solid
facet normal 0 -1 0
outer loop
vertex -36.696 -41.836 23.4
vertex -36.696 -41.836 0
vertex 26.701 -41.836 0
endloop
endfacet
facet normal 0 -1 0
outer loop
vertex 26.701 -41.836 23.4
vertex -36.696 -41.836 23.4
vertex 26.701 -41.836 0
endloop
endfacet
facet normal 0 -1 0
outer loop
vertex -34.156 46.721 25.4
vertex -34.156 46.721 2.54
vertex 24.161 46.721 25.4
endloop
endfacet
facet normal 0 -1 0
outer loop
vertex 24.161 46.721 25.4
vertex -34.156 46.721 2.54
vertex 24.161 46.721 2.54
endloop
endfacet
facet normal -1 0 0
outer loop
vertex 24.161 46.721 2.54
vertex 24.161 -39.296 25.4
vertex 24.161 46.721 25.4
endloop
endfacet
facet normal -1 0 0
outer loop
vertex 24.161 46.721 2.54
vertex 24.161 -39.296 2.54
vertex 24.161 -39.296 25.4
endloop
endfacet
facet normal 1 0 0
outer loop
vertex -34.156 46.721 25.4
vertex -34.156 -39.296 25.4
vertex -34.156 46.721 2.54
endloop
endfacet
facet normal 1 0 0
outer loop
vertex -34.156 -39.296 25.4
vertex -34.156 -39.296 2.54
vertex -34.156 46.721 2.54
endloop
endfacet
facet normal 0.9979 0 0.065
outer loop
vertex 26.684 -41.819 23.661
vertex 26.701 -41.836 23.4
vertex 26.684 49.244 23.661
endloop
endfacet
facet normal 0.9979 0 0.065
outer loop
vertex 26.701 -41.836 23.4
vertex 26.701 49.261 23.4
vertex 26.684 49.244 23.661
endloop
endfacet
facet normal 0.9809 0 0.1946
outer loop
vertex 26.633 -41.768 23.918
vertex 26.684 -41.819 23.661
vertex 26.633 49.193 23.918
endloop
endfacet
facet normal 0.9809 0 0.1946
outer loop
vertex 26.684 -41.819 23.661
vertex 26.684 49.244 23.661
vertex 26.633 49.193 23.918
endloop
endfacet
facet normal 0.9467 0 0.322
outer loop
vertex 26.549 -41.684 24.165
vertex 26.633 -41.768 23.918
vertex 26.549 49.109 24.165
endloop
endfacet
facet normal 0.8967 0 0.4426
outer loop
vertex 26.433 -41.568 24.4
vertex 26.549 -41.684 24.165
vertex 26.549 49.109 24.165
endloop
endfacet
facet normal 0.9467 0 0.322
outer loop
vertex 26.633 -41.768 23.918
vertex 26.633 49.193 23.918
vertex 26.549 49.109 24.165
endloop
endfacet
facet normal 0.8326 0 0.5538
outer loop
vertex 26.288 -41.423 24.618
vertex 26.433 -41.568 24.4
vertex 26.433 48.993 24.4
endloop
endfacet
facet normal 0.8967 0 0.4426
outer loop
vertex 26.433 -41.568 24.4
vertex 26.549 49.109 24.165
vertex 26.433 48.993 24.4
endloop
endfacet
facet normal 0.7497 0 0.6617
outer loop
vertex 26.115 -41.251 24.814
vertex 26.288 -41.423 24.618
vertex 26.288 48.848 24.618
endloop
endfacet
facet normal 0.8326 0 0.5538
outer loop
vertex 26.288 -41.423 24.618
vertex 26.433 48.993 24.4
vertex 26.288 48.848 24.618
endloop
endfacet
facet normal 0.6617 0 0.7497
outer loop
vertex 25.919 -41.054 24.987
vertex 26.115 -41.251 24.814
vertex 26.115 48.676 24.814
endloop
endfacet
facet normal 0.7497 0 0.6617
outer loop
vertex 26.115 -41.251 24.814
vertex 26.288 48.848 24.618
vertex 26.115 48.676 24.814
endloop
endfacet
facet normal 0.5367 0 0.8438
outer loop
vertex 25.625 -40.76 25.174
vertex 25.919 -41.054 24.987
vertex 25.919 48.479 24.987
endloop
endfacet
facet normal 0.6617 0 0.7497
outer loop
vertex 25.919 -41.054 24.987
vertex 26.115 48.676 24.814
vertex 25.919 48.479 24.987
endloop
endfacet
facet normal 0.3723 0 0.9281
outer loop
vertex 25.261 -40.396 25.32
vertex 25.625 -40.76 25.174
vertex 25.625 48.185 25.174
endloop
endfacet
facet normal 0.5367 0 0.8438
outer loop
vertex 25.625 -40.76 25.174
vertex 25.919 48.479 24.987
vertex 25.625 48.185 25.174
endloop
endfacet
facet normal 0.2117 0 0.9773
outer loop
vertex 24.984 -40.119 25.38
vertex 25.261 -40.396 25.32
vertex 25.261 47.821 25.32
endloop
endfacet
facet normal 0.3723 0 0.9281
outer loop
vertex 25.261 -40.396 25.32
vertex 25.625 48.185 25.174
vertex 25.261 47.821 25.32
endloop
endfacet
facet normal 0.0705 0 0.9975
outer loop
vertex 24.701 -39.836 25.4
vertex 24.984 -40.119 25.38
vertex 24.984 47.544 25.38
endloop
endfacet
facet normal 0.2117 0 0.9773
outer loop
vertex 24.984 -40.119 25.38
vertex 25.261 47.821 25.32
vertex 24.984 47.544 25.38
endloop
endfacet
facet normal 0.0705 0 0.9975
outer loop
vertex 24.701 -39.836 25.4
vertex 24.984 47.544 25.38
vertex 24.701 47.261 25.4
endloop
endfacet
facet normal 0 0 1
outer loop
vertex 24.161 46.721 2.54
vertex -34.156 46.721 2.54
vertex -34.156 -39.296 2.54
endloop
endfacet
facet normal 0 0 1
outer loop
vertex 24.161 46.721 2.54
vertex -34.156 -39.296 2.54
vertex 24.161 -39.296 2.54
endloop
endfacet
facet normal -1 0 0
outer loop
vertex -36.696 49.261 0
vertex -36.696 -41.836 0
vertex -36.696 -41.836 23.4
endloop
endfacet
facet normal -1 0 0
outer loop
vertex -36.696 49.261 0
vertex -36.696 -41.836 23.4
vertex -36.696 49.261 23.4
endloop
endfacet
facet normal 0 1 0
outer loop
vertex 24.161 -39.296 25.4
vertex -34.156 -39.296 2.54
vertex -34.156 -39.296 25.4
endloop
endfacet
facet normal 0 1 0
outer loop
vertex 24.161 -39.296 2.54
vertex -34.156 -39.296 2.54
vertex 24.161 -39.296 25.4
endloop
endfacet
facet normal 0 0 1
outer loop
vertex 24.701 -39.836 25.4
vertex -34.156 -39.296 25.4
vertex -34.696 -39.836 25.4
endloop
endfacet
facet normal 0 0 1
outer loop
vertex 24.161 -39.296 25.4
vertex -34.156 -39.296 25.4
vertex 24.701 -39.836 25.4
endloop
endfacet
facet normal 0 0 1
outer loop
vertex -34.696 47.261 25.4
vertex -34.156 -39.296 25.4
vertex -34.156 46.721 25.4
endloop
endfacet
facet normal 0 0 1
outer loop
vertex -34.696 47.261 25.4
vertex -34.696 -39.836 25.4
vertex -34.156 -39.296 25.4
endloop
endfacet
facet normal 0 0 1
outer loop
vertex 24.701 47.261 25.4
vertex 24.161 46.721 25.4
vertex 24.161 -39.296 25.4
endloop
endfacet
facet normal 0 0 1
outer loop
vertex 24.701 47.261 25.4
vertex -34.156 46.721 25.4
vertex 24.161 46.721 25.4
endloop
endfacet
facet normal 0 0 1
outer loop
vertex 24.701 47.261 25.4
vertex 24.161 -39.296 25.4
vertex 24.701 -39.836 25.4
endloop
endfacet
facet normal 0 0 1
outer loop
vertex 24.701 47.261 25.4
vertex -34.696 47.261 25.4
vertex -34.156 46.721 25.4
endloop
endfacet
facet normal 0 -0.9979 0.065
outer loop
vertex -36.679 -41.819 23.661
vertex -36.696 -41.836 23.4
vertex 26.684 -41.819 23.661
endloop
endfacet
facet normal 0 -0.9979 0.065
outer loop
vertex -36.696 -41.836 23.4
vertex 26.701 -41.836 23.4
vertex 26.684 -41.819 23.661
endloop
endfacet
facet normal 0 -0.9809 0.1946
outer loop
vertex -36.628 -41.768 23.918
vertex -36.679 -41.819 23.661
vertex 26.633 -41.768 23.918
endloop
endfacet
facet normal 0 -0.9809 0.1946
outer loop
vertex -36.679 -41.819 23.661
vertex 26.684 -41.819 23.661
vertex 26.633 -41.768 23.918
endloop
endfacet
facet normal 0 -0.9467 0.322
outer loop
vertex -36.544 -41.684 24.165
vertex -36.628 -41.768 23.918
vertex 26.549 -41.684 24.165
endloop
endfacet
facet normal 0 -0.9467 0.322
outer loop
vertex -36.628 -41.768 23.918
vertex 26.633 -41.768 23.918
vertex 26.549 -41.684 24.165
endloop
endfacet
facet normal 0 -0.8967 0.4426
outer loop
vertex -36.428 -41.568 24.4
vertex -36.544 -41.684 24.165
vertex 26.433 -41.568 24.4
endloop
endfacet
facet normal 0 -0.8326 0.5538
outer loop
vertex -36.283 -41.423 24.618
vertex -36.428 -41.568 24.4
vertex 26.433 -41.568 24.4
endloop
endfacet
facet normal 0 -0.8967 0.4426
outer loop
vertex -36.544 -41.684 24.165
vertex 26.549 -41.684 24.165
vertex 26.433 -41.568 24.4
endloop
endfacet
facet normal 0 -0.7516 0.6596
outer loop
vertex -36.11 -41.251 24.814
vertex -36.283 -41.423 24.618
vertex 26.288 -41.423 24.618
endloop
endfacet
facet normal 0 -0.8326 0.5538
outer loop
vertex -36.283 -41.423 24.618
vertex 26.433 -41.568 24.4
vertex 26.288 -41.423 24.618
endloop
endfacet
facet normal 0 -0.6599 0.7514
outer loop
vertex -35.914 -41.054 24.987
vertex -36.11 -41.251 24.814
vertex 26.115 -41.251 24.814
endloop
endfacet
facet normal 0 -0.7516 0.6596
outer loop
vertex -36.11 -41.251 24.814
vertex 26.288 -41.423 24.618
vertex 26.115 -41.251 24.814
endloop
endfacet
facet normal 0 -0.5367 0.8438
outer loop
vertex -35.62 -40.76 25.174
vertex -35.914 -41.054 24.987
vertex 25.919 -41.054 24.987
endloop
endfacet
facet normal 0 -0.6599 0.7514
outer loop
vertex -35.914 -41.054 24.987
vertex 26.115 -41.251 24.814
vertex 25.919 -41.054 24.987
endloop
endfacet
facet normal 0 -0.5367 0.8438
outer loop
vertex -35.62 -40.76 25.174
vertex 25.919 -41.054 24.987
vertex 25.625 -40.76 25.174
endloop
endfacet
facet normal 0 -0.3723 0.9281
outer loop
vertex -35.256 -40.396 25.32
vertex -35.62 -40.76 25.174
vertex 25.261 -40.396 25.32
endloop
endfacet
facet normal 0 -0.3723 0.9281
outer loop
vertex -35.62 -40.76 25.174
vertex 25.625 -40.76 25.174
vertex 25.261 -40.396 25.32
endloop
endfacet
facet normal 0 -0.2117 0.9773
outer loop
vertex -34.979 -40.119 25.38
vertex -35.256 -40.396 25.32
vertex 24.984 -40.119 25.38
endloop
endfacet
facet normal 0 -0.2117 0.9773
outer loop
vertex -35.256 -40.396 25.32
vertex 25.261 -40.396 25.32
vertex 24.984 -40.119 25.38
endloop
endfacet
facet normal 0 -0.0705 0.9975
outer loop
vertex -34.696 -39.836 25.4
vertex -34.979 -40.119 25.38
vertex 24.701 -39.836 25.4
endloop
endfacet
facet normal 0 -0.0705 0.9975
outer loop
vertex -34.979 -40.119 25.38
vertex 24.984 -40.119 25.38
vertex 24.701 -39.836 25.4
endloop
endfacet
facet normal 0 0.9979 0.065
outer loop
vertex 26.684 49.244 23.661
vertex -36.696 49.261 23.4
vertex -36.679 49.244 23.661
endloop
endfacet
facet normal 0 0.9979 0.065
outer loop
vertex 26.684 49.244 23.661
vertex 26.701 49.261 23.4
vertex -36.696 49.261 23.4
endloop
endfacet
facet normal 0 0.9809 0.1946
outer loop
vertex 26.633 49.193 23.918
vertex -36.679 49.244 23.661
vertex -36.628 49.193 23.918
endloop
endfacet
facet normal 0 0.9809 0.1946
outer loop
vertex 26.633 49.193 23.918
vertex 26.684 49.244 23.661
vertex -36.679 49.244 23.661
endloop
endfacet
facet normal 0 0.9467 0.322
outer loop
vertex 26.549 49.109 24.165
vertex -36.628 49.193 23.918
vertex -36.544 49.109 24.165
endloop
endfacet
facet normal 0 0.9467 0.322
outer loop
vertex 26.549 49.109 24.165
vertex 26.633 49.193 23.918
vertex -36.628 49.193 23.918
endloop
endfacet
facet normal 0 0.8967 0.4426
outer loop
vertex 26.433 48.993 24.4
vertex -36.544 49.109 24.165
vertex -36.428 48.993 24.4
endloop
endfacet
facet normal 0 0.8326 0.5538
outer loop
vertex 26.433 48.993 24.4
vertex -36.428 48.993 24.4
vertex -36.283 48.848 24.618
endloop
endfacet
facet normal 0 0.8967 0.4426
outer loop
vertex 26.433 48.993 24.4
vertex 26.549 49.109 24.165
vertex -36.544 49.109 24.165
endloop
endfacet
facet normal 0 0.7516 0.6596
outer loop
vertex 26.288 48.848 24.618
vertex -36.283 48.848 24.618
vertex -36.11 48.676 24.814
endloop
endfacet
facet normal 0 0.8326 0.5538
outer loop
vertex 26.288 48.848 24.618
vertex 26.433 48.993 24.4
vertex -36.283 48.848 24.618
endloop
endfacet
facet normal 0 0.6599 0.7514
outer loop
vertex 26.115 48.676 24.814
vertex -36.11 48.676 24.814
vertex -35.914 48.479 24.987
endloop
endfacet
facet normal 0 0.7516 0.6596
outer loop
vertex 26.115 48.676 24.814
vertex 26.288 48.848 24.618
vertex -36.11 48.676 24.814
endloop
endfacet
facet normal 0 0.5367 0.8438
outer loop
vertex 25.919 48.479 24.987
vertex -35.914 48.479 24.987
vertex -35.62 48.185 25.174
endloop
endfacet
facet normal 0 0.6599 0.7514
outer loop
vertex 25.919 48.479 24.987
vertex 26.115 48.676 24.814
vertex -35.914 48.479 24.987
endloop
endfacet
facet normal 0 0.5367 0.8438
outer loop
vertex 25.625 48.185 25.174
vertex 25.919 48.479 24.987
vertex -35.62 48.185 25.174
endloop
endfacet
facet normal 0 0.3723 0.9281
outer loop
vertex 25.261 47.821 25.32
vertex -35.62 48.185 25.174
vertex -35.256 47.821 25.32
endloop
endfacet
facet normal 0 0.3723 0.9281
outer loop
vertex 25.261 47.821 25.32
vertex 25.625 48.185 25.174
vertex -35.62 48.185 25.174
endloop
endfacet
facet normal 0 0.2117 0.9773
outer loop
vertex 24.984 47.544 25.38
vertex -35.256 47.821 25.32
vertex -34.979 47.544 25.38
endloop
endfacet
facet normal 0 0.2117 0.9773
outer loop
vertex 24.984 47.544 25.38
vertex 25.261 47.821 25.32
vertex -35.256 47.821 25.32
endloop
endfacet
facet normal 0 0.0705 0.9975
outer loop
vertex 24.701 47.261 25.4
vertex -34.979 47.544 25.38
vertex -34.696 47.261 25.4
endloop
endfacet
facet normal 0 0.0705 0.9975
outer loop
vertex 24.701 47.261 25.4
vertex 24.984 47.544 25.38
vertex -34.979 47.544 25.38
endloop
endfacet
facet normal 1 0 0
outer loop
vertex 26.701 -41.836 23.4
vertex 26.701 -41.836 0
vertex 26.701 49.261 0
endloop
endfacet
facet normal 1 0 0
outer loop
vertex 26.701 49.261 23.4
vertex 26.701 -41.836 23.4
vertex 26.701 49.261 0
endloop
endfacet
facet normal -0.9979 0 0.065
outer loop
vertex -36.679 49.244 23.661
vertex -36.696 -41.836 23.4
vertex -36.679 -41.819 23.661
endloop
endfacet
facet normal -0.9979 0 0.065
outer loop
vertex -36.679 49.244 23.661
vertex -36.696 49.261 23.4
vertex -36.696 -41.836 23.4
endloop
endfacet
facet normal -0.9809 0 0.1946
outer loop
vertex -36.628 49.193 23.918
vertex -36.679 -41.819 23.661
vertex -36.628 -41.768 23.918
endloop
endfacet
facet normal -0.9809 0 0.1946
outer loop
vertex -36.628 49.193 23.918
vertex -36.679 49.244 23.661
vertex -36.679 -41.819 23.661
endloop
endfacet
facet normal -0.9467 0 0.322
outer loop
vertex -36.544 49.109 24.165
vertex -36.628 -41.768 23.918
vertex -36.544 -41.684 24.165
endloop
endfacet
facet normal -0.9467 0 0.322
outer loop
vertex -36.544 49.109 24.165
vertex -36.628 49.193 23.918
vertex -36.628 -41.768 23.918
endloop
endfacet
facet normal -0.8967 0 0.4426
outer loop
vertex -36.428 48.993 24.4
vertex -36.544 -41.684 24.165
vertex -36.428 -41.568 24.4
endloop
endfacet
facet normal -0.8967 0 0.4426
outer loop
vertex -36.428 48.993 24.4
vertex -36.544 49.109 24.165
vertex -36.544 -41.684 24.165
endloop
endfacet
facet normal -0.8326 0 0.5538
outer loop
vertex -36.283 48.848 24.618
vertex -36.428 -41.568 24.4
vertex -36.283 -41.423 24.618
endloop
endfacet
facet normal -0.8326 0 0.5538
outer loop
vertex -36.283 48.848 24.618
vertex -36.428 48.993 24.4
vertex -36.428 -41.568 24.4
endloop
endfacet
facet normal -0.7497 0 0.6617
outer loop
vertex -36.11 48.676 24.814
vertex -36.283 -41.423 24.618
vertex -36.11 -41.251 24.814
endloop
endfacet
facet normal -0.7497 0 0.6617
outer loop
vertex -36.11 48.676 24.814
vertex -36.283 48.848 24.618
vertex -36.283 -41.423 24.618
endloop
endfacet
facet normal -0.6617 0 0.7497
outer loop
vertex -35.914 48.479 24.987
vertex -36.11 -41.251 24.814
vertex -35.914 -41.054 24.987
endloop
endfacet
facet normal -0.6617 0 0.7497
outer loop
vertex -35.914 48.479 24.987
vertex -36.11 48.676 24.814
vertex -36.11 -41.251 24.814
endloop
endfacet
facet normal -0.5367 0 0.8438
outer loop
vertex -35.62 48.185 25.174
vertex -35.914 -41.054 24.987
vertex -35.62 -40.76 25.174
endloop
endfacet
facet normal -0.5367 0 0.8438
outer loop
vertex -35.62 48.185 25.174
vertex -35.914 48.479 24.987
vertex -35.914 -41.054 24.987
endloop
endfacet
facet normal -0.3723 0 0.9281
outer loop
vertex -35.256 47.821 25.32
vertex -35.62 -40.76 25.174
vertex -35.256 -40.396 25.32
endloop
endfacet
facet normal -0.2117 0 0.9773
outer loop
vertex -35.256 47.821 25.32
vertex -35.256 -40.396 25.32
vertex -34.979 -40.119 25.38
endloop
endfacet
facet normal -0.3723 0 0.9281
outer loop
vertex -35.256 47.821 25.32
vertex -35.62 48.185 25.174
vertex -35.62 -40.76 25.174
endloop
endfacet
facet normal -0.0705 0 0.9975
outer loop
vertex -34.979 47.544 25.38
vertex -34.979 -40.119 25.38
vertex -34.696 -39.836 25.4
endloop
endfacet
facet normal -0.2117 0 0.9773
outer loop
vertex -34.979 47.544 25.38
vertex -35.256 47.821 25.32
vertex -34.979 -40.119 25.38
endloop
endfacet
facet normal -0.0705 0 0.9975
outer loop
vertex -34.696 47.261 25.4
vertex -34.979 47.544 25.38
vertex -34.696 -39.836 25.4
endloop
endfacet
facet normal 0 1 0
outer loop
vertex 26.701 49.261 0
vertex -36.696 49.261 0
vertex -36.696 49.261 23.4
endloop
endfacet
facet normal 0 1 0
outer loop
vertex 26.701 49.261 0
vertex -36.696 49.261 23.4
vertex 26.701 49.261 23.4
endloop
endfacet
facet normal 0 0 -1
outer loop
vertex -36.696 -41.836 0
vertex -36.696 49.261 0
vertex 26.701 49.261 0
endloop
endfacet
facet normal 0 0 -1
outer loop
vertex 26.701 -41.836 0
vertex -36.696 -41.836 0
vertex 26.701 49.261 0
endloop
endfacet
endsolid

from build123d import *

# Parameters (mm, degrees)
F0_W     = 63.397132
F0_H     = 91.097686
F1_DEPTH = 25.4
F2_T     = -2.54
F3_R     = 2


with BuildPart() as f1:
    # F0 (on Top) → F1 (new body)
    with BuildSketch(Plane.XY):
        with Locations((-4.997522, 3.712451)):
            Rectangle(F0_W, F0_H)
    extrude(amount=F1_DEPTH)

    # F2
    f2_openings = [f1.faces().sort_by_distance(p)[0] for p in [
        (-4.997522, 3.712451, 25.4),
    ]]
    offset(amount=F2_T, openings=f2_openings)

    # F3
    f3_edges = [f1.edges().sort_by_distance(p)[0] for p in [
        (26.701044, 3.712451, 25.4),
        (-4.997522, -41.836392, 25.4),
        (-36.696088, 3.712451, 25.4),
        (-4.997522, 49.261294, 25.4),
    ]]
    fillet(f3_edges, radius=F3_R)


solid = f1.part
